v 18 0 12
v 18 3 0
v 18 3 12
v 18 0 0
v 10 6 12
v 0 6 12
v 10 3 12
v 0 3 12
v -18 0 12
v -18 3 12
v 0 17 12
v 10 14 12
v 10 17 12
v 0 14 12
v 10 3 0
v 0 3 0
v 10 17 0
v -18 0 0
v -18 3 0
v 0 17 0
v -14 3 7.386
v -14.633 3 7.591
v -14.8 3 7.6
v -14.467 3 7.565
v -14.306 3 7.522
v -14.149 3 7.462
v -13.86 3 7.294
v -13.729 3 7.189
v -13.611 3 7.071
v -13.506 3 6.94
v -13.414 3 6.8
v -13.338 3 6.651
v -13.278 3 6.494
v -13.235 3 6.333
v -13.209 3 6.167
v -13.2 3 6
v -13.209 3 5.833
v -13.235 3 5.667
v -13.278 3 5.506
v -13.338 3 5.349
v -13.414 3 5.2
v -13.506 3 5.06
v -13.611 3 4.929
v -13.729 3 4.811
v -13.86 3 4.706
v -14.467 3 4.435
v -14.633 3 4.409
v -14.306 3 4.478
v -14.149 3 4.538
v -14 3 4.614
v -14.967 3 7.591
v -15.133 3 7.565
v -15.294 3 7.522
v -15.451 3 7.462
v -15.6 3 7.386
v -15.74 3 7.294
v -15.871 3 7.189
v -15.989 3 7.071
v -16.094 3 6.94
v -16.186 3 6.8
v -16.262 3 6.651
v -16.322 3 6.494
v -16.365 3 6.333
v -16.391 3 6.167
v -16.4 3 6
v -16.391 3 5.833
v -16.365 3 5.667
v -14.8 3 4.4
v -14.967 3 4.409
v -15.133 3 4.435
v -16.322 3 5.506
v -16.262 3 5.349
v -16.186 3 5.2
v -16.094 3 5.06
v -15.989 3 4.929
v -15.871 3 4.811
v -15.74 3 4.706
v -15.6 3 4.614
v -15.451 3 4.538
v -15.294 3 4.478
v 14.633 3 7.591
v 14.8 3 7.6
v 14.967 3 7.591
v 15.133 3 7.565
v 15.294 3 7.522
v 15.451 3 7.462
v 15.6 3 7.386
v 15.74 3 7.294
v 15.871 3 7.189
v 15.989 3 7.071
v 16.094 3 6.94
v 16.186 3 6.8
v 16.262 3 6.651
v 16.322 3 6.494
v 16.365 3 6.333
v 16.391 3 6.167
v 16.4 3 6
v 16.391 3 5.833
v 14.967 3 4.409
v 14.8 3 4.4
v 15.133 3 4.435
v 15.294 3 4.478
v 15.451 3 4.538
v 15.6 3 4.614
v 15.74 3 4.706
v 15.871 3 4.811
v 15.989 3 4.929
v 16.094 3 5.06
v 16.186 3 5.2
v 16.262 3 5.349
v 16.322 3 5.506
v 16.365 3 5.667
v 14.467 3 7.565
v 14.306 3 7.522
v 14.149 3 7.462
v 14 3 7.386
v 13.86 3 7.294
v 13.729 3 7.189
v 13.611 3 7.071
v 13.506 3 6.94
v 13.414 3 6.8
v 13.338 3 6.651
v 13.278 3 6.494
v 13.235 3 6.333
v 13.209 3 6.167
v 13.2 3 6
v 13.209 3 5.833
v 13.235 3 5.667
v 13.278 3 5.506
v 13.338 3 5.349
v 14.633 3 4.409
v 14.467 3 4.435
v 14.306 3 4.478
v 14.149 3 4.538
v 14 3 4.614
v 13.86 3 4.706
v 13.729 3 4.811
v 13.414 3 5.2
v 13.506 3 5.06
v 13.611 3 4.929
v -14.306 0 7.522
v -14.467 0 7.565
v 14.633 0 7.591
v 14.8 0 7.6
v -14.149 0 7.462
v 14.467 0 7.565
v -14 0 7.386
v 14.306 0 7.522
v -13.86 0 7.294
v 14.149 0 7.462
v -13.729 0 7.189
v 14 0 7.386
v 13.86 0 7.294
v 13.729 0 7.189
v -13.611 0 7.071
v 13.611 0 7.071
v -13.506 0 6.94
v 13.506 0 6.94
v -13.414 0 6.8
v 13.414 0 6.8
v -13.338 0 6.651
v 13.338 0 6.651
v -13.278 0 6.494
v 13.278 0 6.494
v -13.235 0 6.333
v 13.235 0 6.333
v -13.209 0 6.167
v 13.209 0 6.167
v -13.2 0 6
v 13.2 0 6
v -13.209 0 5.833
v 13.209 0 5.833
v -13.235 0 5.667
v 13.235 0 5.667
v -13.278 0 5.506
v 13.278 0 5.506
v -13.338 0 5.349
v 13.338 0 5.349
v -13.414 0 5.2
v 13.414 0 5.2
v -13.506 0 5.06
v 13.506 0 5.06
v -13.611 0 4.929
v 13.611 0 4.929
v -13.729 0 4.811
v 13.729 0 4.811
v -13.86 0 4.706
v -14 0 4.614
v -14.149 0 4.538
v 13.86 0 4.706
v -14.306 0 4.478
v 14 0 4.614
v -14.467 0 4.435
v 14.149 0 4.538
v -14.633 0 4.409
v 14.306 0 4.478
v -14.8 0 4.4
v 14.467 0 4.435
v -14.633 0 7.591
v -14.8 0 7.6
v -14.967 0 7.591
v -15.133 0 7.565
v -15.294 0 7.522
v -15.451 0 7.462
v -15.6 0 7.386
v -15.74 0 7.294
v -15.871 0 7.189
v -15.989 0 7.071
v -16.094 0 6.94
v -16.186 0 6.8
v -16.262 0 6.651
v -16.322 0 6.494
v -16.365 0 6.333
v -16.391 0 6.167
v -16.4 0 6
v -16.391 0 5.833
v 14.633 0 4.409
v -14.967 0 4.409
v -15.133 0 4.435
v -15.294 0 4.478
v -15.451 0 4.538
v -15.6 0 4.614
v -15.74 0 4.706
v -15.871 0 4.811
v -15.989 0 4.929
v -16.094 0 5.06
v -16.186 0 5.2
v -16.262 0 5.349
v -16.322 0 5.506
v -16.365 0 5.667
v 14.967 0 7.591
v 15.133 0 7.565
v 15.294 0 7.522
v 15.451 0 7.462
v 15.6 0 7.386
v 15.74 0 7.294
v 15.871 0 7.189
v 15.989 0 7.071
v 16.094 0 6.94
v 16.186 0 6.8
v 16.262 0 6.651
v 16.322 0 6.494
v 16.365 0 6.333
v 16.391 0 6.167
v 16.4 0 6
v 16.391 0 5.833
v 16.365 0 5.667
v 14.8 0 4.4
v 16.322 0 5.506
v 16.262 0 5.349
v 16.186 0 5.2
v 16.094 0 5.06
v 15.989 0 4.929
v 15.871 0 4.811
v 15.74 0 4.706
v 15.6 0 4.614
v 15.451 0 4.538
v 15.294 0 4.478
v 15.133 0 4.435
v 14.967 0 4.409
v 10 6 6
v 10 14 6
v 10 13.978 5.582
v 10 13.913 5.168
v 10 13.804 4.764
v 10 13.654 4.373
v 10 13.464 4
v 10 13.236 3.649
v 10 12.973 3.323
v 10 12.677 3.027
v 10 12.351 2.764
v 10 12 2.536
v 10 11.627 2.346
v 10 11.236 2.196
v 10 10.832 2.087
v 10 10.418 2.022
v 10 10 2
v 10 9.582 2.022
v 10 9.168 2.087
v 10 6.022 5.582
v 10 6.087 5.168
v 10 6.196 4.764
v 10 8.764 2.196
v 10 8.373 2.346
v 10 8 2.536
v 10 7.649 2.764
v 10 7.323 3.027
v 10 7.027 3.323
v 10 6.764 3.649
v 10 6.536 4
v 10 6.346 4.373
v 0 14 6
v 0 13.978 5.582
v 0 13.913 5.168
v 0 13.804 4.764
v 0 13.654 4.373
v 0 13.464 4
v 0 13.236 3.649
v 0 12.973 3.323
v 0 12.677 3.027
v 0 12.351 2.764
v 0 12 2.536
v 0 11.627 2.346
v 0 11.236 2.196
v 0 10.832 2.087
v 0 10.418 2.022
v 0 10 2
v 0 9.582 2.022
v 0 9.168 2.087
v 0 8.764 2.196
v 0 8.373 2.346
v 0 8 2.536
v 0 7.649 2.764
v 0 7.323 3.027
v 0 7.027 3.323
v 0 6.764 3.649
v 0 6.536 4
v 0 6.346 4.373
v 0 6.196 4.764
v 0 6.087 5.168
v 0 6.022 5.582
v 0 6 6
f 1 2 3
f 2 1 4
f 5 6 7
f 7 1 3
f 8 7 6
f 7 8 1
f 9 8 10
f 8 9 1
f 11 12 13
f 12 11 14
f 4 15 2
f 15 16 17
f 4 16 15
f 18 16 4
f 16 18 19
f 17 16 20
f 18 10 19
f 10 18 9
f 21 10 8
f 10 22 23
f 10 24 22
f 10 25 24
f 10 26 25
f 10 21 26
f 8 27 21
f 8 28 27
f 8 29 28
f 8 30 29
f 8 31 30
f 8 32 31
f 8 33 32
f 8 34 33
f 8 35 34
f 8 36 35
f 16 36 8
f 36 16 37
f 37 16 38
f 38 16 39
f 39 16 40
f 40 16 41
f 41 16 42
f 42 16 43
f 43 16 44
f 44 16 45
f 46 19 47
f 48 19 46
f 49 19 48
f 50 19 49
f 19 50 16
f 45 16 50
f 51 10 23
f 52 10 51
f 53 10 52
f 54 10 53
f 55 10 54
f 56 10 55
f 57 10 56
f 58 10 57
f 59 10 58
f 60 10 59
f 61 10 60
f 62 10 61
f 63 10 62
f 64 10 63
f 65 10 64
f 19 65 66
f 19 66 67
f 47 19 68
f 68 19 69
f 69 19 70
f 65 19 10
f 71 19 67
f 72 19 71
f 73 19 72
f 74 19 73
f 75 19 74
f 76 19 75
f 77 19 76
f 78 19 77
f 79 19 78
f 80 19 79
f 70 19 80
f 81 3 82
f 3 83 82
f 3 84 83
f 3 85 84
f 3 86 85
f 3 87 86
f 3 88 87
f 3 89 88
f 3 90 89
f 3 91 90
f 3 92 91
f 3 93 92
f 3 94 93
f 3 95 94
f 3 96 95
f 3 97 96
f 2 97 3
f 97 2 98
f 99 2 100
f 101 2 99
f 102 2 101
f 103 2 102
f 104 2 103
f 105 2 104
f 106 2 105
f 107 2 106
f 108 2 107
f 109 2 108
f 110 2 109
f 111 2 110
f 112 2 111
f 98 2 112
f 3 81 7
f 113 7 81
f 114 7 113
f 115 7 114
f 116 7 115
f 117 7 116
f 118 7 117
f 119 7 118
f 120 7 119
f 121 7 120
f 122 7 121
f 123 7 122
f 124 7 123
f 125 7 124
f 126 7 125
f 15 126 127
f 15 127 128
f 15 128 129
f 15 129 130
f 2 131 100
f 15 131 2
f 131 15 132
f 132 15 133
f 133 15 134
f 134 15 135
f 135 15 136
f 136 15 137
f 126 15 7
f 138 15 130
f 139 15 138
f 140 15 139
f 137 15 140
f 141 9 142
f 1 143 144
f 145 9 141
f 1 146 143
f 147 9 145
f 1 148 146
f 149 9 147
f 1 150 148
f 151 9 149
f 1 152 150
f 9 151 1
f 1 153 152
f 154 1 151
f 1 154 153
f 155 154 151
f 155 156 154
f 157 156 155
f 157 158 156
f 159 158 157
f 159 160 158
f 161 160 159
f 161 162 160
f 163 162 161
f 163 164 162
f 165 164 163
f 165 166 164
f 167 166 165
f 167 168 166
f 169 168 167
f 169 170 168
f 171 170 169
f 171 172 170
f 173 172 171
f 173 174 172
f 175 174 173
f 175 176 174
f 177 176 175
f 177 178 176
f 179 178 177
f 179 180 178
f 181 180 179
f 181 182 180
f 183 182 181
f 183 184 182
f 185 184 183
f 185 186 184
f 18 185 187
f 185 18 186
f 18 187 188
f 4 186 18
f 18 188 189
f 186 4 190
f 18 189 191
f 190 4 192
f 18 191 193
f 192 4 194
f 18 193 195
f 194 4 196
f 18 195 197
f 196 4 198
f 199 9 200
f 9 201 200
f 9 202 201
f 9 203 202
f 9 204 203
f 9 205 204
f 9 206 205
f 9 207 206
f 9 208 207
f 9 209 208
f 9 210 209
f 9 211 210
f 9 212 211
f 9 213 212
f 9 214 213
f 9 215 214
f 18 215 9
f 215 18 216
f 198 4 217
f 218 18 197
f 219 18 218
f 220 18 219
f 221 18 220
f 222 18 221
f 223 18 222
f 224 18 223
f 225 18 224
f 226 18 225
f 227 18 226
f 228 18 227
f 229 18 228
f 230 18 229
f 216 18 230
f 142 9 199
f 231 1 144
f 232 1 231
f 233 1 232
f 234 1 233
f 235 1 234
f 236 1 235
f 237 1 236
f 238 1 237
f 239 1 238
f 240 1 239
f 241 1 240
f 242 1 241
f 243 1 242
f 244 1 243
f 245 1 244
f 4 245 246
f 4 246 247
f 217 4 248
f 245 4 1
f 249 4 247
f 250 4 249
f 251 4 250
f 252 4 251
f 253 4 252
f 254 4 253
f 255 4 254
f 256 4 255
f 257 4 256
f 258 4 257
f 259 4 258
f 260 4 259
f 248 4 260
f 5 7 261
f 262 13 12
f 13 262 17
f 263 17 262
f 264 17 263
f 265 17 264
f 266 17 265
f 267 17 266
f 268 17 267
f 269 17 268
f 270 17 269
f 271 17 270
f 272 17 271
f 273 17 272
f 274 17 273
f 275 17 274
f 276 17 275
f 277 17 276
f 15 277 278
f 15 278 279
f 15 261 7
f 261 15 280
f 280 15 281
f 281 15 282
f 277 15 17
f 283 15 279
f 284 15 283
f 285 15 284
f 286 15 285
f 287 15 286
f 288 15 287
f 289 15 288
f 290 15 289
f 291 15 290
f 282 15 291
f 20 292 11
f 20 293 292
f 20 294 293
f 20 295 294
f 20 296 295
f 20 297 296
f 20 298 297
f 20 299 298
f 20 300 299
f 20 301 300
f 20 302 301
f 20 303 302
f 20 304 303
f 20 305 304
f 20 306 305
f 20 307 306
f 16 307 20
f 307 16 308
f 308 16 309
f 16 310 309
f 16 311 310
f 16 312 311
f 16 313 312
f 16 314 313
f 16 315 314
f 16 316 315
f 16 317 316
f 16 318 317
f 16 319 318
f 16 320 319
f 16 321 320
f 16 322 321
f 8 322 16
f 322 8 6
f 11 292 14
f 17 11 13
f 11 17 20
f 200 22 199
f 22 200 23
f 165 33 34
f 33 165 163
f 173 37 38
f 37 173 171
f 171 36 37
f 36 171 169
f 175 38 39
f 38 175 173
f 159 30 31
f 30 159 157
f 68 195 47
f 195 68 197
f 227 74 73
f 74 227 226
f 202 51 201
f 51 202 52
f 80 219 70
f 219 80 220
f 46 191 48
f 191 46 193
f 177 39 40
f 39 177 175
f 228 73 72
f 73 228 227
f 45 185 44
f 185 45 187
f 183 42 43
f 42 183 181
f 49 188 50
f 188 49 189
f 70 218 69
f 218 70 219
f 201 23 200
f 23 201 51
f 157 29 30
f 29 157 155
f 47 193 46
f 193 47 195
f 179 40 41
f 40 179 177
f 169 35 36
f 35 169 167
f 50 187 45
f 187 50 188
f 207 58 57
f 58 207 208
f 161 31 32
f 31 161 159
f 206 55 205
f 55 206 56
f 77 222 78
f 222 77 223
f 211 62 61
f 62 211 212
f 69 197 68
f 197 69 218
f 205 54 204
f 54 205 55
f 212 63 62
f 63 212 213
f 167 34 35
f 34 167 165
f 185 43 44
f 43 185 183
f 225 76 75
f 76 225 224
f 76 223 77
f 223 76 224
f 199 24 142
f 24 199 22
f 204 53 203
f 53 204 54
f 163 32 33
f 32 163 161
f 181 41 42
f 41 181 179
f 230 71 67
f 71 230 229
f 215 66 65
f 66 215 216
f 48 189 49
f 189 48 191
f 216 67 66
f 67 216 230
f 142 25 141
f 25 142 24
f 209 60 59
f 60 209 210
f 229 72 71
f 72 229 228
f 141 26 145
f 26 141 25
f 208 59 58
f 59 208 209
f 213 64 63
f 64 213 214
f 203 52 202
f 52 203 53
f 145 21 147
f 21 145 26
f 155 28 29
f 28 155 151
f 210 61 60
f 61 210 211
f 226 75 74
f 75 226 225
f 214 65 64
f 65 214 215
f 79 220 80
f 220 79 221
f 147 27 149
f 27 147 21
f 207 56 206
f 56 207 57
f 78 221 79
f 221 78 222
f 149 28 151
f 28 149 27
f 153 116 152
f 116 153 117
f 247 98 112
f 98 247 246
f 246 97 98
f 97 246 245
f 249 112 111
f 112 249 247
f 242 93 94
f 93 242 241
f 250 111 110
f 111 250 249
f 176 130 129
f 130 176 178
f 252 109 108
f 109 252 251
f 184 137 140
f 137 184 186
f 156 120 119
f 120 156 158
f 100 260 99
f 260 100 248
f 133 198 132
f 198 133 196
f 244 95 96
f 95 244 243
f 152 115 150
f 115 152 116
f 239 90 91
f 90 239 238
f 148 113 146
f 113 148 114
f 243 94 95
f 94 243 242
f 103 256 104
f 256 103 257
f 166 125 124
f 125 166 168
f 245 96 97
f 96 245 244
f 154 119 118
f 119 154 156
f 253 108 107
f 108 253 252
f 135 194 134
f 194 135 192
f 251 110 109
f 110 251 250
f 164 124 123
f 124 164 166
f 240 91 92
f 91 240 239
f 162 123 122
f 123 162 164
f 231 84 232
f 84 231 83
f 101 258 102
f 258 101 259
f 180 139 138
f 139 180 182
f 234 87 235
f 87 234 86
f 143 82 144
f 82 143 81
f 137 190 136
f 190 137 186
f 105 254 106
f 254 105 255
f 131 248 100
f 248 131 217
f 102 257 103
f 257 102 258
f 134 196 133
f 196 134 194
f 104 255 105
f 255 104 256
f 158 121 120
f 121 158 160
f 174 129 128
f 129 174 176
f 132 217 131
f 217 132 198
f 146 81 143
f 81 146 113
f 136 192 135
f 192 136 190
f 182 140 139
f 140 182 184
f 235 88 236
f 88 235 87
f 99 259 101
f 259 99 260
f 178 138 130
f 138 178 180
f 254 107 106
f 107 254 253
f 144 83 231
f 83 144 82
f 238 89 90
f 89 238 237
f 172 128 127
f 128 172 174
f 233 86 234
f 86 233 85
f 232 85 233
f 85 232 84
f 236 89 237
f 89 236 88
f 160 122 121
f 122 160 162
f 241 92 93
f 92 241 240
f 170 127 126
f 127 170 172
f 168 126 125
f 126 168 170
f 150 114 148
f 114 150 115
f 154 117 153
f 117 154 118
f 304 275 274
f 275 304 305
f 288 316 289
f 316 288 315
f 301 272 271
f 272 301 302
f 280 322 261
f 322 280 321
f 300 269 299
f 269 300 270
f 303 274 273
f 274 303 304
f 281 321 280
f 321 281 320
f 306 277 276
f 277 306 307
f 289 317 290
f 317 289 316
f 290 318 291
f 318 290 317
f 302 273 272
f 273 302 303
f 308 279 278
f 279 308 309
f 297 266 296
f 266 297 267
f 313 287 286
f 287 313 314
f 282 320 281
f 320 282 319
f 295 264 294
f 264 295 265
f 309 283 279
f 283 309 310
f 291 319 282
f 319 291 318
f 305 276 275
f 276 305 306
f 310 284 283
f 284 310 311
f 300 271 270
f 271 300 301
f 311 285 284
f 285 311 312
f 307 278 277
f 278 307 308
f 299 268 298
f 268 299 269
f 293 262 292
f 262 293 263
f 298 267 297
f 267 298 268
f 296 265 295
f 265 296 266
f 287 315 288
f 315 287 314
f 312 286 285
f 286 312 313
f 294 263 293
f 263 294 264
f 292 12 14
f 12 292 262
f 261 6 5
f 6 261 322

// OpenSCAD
/*
 * bowden extruder mount
 **
 * Serendipitously you can just run an M6 nyloc nut onto the end of the PTFE
 * tube for a perfect grip
 *
 * Copyright 2012 <b@Zi.iS>
 * License CC BY 3.0
 */
$fn = 60;

m3 = 3.2 /2;
m6_nyloc = [
	11.28 /2,
	6
];

rotate([
	0,
	0,
	0
]) {
	mount();

}

module mount(
	bolt = m3,
	pitch = 50,
	bowden = 5.6/2,
	bowden_nut = m6_nyloc,
	t = 3
) {
	size = [
		pitch + bolt*2 + t*2,
		t*2,
		bowden_nut[1] + t*2
	];

	difference() {
		union() {translate([
			-size[0]/4 - bolt*2,
			0,
			0
		]) {
			cube([
				size[0]/2 + bolt*4,
				size[1]/2,
				size[2]
			]);
		}

		translate([
			0,
			0,
			0
		]) {
			cube([
				10,
				8+t*3,
				size[2]
			]);
		}}

		translate([-1,4+t*2,size[2]/2]) {
		rotate([0,90,0]) {
		cylinder(
			r=8/2,
			h=20
		);}}

		translate([-1,t*2,6]) {
			cube([15,8,8]);
		}
	

		//bolts
		for(x=[0:1]){
			translate([
				-size[0]/4 + size[0]/2*x,
				-1,
				size[2]/2
			]) {
				rotate([
					-90,
					0,
					0
				]) {
					cylinder(
						r = bolt,
						h = size[1]
					);
				}
			}
		}
	}
}	
